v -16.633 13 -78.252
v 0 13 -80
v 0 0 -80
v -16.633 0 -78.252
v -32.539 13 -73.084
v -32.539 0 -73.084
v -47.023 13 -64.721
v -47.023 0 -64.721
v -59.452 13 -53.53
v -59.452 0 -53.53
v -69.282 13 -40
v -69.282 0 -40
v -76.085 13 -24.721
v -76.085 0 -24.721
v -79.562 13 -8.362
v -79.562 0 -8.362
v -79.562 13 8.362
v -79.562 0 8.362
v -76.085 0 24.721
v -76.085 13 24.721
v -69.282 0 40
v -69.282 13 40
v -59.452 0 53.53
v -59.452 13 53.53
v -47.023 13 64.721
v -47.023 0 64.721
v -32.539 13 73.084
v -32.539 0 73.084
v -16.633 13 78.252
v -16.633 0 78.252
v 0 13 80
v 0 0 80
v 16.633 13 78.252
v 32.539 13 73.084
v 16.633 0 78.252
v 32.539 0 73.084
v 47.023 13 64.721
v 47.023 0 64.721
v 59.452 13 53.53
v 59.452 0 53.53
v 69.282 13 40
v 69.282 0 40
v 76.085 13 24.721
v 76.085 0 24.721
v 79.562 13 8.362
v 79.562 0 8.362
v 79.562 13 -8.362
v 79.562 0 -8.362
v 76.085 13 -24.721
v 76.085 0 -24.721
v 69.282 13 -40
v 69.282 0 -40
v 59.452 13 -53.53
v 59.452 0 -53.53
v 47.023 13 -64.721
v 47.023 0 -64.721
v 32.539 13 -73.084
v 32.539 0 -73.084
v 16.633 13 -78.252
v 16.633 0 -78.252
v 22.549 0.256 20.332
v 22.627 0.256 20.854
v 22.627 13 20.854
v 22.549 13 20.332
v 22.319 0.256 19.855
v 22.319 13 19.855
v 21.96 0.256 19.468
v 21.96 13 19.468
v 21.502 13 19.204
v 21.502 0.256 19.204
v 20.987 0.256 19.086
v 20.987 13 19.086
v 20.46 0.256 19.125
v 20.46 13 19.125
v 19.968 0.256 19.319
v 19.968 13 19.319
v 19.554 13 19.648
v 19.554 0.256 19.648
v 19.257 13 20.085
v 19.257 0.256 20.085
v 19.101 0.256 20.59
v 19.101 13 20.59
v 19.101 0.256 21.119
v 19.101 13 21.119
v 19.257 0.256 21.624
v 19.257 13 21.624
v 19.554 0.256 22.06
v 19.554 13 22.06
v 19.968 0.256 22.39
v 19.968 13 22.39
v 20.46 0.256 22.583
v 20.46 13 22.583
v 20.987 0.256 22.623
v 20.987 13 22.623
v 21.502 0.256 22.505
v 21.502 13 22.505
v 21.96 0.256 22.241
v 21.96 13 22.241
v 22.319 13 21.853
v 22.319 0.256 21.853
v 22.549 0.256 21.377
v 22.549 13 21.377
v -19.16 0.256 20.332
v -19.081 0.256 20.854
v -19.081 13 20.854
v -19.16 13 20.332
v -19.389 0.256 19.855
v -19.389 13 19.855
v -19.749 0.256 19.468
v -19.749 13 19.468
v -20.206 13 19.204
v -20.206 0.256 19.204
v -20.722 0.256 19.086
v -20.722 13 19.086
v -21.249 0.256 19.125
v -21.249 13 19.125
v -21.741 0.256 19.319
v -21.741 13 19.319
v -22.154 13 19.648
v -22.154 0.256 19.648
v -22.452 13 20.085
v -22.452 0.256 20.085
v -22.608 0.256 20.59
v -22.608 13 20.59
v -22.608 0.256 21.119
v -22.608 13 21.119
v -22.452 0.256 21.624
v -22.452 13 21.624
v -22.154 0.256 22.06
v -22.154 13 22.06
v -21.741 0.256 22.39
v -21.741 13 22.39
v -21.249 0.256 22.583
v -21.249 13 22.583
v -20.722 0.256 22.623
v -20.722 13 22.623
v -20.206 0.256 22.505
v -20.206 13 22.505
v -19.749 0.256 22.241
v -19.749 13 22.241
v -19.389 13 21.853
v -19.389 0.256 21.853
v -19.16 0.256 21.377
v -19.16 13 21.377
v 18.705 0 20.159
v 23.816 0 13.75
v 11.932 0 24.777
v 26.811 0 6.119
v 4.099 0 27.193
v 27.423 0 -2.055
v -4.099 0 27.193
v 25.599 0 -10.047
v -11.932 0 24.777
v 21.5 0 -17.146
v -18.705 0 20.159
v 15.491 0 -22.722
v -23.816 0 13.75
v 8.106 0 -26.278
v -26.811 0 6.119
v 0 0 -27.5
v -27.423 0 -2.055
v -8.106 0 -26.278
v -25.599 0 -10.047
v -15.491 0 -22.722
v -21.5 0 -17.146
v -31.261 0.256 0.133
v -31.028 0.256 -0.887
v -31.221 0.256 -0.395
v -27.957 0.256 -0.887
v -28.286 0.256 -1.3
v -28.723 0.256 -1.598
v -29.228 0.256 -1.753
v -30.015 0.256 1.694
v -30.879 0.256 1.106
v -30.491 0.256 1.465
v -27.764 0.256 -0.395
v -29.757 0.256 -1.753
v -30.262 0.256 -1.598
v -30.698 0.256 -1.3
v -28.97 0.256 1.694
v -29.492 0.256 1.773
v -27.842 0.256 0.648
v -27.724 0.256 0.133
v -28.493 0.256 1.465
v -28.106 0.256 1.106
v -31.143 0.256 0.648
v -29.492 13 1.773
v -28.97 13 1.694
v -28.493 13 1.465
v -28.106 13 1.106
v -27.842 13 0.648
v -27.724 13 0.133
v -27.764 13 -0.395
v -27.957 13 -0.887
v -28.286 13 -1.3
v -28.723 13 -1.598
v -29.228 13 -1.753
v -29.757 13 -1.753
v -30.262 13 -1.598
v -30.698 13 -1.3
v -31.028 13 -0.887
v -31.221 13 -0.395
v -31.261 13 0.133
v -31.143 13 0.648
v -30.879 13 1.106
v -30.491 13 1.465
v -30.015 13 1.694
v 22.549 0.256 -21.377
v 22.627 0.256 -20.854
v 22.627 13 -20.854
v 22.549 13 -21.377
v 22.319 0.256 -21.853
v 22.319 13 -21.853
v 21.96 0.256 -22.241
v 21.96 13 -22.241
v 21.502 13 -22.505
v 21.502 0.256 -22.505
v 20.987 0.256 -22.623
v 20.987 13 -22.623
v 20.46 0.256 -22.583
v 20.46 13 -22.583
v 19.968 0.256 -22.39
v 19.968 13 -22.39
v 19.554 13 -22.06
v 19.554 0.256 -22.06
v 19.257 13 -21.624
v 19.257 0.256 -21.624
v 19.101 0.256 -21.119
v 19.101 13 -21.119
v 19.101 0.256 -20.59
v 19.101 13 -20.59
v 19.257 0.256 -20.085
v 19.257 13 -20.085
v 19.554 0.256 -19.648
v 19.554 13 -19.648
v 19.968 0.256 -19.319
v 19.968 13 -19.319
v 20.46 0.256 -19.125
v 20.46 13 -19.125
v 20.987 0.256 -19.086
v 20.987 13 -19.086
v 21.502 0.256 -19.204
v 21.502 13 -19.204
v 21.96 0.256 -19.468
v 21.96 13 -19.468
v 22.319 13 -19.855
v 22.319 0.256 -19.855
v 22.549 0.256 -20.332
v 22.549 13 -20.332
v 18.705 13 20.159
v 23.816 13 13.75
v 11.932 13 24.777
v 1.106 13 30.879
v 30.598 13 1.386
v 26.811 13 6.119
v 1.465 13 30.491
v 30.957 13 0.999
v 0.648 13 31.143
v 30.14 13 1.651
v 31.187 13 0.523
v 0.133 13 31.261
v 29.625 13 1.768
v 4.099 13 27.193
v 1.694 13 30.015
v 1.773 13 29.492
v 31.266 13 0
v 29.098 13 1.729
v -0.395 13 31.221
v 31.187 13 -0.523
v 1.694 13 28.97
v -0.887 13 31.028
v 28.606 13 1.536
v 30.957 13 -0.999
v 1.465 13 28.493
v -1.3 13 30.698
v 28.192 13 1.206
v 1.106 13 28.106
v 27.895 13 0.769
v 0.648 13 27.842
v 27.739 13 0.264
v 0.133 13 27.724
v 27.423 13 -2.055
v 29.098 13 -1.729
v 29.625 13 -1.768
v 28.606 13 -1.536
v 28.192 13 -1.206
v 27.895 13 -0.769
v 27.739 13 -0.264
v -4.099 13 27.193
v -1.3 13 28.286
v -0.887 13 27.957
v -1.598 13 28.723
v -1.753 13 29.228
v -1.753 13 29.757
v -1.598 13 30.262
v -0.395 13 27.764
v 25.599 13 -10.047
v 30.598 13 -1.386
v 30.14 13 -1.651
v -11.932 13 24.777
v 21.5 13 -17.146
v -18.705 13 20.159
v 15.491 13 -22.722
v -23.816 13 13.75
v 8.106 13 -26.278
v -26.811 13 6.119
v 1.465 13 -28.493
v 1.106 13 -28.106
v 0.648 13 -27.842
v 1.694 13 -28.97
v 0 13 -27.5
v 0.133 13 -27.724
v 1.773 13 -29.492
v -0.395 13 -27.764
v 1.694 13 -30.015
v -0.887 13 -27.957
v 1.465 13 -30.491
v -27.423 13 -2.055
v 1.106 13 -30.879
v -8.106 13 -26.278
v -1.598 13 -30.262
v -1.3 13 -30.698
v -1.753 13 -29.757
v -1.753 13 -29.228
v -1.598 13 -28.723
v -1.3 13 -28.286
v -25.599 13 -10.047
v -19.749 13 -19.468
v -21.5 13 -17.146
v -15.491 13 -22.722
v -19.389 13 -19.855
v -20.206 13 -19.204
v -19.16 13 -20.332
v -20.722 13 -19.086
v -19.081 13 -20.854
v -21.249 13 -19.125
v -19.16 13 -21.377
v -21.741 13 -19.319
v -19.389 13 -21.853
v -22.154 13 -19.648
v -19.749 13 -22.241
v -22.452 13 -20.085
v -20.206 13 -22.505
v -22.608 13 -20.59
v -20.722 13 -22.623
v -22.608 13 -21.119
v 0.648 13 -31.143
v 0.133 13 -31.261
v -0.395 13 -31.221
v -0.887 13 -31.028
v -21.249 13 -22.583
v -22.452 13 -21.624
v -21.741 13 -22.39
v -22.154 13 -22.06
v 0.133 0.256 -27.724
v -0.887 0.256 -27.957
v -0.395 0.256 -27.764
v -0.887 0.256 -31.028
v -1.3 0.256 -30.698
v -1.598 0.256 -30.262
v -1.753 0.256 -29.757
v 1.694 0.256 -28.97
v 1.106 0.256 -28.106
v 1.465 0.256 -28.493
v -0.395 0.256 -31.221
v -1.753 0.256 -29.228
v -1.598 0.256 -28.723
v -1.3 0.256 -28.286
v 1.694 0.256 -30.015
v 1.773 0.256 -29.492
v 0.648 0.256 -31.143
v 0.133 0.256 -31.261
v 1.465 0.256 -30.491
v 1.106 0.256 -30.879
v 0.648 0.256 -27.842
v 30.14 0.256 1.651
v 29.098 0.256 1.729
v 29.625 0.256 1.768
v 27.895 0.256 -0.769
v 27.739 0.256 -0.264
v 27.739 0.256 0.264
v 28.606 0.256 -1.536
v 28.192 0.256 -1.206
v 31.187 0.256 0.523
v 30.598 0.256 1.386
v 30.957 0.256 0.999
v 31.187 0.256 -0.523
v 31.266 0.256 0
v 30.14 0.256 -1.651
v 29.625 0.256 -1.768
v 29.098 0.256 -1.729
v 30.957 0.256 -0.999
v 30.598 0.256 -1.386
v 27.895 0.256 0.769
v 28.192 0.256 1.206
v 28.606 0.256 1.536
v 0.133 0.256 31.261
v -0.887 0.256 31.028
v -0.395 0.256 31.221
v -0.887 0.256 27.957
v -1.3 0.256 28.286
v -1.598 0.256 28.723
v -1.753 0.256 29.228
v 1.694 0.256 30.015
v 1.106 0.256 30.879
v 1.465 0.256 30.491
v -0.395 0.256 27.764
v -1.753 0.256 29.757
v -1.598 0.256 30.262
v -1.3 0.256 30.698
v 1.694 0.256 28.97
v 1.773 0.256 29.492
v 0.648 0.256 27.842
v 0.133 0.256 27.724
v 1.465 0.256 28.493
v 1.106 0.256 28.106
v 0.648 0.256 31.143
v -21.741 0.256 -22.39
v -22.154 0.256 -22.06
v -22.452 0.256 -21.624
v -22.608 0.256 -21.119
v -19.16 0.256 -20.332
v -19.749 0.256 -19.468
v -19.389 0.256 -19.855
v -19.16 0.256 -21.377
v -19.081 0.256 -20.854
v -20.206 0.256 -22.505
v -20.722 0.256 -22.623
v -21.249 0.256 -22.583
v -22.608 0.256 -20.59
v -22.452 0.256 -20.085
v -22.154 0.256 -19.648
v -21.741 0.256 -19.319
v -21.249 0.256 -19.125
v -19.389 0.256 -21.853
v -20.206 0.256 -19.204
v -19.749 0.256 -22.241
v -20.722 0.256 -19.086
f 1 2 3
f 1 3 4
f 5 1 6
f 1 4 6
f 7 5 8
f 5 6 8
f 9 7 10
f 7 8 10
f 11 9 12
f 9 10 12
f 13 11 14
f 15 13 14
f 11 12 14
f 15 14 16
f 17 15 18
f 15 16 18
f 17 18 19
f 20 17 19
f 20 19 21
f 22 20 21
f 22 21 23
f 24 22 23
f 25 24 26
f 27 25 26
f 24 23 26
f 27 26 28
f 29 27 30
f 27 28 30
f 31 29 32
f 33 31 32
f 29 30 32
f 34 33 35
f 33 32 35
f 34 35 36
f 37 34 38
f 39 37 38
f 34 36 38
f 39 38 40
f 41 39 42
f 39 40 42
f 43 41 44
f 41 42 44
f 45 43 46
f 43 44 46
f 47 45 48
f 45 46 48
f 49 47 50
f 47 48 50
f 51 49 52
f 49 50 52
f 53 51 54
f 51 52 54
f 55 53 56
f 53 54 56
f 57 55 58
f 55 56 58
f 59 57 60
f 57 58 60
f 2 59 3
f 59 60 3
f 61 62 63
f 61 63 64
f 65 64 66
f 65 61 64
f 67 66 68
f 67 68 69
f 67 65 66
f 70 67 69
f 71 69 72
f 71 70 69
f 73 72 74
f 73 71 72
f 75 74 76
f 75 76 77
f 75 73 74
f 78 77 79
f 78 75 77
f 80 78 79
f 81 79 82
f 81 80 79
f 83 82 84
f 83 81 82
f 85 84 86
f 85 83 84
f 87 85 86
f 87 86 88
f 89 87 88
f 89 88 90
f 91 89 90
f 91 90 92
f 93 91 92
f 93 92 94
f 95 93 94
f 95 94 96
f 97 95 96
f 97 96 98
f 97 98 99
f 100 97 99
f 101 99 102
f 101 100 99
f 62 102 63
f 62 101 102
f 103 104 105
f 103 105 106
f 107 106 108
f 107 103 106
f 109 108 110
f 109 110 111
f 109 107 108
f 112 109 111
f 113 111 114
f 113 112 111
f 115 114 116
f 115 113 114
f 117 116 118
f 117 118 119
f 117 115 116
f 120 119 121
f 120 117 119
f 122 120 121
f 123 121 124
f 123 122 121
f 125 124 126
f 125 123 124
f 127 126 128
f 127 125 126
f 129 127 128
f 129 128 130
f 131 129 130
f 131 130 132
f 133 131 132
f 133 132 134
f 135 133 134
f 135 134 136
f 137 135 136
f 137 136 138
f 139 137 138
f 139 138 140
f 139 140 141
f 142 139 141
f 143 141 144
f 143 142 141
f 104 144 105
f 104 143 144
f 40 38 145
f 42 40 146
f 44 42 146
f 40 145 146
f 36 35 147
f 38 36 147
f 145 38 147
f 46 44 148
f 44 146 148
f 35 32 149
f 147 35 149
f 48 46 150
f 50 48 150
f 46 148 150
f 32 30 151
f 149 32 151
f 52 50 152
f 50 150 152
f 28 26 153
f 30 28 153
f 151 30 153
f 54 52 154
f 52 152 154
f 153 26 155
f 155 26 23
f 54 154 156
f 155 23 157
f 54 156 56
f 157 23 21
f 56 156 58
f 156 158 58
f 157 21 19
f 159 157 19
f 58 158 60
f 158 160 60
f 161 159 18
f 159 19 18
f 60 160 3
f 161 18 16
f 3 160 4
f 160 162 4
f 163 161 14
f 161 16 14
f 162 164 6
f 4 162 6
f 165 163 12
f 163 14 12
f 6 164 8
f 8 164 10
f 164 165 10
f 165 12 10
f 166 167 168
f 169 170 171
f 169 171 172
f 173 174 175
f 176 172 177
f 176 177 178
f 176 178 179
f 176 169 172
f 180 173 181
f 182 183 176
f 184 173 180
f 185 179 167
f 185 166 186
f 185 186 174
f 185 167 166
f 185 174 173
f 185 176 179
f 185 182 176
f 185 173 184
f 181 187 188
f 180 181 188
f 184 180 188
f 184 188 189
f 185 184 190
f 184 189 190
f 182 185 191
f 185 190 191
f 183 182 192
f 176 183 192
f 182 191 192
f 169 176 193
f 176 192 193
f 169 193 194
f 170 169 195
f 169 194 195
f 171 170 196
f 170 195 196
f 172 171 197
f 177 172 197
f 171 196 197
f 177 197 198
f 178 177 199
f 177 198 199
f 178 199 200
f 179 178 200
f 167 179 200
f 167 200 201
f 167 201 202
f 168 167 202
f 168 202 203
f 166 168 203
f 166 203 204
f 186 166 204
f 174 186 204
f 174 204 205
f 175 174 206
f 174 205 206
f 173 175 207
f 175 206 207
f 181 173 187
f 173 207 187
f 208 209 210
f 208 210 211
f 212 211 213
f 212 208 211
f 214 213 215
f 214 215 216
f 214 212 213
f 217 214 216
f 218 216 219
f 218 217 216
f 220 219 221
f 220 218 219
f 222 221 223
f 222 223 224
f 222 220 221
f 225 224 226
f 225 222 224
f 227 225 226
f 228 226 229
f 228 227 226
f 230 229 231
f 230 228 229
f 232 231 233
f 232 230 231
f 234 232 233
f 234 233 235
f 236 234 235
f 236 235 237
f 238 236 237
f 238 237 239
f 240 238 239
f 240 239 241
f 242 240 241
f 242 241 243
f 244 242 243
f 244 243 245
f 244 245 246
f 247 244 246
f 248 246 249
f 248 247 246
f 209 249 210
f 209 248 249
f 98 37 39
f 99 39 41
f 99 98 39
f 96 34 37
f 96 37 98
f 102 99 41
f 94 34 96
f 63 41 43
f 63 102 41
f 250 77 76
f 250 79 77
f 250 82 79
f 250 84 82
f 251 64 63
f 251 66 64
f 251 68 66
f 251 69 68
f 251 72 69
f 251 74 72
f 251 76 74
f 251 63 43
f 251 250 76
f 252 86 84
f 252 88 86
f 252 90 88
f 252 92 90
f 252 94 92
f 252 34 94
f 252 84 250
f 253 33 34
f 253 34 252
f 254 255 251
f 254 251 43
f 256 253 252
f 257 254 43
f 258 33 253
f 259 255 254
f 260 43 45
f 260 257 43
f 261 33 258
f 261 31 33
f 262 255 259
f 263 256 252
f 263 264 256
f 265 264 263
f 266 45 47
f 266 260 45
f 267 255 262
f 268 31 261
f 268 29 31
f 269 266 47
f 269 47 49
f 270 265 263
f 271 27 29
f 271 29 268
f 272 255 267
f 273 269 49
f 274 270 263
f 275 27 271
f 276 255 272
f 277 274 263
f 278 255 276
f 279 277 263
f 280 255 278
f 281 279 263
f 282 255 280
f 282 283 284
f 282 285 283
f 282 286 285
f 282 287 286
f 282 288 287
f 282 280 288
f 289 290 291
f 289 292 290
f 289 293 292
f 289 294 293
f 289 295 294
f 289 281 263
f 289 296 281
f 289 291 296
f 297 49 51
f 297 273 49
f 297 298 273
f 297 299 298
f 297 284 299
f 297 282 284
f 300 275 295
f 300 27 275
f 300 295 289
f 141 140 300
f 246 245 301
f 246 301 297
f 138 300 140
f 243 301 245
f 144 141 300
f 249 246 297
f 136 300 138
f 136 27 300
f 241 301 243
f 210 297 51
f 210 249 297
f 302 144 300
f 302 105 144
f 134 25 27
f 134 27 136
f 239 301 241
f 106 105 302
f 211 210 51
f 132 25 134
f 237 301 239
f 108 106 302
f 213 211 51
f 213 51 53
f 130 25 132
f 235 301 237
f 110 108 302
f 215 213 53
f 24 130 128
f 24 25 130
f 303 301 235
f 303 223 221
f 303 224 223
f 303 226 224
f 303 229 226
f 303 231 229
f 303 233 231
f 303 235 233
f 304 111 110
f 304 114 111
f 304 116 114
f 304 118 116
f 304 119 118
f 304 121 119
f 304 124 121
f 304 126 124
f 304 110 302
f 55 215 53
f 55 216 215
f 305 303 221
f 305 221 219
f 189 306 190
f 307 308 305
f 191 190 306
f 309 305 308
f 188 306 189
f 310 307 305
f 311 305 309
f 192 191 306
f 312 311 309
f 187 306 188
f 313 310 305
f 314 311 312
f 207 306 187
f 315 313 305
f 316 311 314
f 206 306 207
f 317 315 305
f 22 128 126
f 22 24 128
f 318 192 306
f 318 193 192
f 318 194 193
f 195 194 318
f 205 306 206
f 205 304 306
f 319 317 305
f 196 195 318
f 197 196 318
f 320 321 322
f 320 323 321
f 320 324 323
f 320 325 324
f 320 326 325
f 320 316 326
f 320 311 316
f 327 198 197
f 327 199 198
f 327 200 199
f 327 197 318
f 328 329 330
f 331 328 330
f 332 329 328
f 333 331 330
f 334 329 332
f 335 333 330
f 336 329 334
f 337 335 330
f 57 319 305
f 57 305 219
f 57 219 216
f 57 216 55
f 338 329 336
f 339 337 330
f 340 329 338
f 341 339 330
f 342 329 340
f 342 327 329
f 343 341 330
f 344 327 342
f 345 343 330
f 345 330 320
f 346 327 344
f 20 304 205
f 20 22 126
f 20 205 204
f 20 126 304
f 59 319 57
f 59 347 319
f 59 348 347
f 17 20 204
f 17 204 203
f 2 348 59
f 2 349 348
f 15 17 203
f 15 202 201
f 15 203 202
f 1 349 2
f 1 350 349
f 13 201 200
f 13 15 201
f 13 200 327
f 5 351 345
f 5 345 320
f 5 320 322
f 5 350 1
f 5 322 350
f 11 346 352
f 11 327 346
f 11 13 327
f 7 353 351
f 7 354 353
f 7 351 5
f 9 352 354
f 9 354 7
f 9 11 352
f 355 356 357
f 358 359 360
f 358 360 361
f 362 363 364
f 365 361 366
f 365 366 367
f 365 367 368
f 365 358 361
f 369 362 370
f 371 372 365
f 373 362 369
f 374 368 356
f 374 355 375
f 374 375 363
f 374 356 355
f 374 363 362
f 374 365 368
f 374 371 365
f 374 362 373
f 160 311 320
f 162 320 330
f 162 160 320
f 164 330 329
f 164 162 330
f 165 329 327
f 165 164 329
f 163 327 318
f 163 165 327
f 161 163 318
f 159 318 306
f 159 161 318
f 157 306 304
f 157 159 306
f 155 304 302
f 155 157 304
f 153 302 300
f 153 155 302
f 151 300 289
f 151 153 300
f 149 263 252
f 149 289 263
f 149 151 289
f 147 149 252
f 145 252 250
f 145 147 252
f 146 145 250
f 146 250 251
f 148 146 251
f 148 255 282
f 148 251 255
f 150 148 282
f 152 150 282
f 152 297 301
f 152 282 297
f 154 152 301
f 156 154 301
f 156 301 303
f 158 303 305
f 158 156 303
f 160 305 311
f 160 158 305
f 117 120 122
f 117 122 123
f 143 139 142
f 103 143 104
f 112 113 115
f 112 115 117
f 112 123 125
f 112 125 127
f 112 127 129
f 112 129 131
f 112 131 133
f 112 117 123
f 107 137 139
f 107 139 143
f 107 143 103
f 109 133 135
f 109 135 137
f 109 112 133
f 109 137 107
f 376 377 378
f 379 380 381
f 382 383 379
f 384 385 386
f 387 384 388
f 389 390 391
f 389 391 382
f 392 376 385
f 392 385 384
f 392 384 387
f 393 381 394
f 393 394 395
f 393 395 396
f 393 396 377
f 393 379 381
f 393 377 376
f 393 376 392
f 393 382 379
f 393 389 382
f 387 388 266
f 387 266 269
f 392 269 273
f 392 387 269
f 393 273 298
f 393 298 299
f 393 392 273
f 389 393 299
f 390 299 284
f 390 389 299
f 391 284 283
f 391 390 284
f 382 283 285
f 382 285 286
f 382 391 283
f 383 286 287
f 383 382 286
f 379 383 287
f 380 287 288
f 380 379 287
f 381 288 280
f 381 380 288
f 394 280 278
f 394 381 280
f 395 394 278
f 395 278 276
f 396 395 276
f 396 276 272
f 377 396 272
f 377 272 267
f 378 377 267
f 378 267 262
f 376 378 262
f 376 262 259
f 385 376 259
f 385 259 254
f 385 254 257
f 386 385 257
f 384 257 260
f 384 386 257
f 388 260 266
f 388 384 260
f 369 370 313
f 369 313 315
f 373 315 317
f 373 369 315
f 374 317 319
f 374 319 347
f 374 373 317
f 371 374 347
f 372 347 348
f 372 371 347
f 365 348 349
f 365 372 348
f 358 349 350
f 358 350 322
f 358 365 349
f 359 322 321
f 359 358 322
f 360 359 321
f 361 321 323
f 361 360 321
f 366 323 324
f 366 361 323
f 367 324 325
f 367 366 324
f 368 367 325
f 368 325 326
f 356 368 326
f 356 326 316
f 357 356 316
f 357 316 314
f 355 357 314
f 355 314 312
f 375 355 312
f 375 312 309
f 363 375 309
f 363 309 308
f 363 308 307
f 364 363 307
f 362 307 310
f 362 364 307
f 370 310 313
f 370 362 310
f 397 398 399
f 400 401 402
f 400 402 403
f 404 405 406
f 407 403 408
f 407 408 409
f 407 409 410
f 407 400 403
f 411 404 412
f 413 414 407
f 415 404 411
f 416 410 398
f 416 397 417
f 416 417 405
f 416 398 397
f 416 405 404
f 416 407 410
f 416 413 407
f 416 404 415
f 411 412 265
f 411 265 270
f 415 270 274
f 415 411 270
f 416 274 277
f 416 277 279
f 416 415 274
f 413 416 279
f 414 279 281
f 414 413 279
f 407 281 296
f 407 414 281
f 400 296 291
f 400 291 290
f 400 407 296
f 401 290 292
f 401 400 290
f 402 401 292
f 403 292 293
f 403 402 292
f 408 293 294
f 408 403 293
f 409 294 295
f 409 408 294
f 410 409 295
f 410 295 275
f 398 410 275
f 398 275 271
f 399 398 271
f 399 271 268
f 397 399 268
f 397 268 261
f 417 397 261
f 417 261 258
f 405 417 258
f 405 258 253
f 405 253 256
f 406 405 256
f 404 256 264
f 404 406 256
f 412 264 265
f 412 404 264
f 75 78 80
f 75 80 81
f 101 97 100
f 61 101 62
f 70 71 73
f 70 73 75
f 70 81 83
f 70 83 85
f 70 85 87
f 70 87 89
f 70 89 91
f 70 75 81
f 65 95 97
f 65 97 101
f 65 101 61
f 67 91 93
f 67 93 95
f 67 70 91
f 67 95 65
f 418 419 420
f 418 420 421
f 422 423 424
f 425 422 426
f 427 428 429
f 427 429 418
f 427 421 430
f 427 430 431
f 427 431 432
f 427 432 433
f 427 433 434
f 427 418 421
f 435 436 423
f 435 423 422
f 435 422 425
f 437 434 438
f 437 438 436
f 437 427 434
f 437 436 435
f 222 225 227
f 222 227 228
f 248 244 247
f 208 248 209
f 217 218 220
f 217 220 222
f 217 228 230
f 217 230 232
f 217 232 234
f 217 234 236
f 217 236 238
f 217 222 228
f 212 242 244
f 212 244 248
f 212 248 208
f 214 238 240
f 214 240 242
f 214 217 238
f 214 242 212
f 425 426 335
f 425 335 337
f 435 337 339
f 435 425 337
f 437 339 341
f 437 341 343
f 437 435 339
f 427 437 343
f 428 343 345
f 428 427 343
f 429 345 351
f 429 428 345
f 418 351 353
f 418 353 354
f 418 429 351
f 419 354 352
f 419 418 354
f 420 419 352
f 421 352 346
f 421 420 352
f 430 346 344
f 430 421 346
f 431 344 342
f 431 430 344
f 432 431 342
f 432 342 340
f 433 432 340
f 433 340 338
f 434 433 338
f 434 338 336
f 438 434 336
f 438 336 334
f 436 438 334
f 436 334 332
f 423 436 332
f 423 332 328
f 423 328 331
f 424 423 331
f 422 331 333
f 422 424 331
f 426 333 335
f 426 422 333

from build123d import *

# Parameters (mm, degrees)
SKETCH1_R           = 80
BOSS_EXTRUDE1_DEPTH = 13
SKETCH2_R           = 27.5
CUT_EXTRUDE1_DEPTH  = 114.881517377
SKETCH3_R           = 1.77324001
CUT_EXTRUDE2_DEPTH  = 12.744097501
CIRPATTERN1_COUNT   = 8


with BuildPart() as part:
    # Sketch1 → Boss-Extrude1 (new body)
    with BuildSketch(Plane(origin=(0, 0, 0), x_dir=(1, 0, 0), z_dir=(0, 1, 0))):
        Circle(SKETCH1_R)
    extrude(amount=BOSS_EXTRUDE1_DEPTH)

    # Sketch2 → Cut-Extrude1 (cut, through all)
    with BuildSketch(Plane(origin=(0, 0, 0), x_dir=(1, 0, 0), z_dir=(0, 1, 0))):
        Circle(SKETCH2_R)
    extrude(amount=CUT_EXTRUDE1_DEPTH, mode=Mode.SUBTRACT)

    # Sketch3 → Cut-Extrude2 (cut)
    with BuildSketch(Plane(origin=(0, 13, 0), x_dir=(1, 0, 0), z_dir=(0, 1, 0))):
        with Locations((-29.492361813, 0)):
            Circle(SKETCH3_R)
    cut_extrude2 = extrude(amount=-CUT_EXTRUDE2_DEPTH, mode=Mode.SUBTRACT)

    # CirPattern1: Cut-Extrude2 ×8 about axis
    cirpattern1_axis = Axis((0, 0, 0), (0, 1, 0))
    for i in range(1, CIRPATTERN1_COUNT):
        add(cut_extrude2.rotate(cirpattern1_axis, i * 360 / CIRPATTERN1_COUNT), mode=Mode.SUBTRACT)


solid = part.part
